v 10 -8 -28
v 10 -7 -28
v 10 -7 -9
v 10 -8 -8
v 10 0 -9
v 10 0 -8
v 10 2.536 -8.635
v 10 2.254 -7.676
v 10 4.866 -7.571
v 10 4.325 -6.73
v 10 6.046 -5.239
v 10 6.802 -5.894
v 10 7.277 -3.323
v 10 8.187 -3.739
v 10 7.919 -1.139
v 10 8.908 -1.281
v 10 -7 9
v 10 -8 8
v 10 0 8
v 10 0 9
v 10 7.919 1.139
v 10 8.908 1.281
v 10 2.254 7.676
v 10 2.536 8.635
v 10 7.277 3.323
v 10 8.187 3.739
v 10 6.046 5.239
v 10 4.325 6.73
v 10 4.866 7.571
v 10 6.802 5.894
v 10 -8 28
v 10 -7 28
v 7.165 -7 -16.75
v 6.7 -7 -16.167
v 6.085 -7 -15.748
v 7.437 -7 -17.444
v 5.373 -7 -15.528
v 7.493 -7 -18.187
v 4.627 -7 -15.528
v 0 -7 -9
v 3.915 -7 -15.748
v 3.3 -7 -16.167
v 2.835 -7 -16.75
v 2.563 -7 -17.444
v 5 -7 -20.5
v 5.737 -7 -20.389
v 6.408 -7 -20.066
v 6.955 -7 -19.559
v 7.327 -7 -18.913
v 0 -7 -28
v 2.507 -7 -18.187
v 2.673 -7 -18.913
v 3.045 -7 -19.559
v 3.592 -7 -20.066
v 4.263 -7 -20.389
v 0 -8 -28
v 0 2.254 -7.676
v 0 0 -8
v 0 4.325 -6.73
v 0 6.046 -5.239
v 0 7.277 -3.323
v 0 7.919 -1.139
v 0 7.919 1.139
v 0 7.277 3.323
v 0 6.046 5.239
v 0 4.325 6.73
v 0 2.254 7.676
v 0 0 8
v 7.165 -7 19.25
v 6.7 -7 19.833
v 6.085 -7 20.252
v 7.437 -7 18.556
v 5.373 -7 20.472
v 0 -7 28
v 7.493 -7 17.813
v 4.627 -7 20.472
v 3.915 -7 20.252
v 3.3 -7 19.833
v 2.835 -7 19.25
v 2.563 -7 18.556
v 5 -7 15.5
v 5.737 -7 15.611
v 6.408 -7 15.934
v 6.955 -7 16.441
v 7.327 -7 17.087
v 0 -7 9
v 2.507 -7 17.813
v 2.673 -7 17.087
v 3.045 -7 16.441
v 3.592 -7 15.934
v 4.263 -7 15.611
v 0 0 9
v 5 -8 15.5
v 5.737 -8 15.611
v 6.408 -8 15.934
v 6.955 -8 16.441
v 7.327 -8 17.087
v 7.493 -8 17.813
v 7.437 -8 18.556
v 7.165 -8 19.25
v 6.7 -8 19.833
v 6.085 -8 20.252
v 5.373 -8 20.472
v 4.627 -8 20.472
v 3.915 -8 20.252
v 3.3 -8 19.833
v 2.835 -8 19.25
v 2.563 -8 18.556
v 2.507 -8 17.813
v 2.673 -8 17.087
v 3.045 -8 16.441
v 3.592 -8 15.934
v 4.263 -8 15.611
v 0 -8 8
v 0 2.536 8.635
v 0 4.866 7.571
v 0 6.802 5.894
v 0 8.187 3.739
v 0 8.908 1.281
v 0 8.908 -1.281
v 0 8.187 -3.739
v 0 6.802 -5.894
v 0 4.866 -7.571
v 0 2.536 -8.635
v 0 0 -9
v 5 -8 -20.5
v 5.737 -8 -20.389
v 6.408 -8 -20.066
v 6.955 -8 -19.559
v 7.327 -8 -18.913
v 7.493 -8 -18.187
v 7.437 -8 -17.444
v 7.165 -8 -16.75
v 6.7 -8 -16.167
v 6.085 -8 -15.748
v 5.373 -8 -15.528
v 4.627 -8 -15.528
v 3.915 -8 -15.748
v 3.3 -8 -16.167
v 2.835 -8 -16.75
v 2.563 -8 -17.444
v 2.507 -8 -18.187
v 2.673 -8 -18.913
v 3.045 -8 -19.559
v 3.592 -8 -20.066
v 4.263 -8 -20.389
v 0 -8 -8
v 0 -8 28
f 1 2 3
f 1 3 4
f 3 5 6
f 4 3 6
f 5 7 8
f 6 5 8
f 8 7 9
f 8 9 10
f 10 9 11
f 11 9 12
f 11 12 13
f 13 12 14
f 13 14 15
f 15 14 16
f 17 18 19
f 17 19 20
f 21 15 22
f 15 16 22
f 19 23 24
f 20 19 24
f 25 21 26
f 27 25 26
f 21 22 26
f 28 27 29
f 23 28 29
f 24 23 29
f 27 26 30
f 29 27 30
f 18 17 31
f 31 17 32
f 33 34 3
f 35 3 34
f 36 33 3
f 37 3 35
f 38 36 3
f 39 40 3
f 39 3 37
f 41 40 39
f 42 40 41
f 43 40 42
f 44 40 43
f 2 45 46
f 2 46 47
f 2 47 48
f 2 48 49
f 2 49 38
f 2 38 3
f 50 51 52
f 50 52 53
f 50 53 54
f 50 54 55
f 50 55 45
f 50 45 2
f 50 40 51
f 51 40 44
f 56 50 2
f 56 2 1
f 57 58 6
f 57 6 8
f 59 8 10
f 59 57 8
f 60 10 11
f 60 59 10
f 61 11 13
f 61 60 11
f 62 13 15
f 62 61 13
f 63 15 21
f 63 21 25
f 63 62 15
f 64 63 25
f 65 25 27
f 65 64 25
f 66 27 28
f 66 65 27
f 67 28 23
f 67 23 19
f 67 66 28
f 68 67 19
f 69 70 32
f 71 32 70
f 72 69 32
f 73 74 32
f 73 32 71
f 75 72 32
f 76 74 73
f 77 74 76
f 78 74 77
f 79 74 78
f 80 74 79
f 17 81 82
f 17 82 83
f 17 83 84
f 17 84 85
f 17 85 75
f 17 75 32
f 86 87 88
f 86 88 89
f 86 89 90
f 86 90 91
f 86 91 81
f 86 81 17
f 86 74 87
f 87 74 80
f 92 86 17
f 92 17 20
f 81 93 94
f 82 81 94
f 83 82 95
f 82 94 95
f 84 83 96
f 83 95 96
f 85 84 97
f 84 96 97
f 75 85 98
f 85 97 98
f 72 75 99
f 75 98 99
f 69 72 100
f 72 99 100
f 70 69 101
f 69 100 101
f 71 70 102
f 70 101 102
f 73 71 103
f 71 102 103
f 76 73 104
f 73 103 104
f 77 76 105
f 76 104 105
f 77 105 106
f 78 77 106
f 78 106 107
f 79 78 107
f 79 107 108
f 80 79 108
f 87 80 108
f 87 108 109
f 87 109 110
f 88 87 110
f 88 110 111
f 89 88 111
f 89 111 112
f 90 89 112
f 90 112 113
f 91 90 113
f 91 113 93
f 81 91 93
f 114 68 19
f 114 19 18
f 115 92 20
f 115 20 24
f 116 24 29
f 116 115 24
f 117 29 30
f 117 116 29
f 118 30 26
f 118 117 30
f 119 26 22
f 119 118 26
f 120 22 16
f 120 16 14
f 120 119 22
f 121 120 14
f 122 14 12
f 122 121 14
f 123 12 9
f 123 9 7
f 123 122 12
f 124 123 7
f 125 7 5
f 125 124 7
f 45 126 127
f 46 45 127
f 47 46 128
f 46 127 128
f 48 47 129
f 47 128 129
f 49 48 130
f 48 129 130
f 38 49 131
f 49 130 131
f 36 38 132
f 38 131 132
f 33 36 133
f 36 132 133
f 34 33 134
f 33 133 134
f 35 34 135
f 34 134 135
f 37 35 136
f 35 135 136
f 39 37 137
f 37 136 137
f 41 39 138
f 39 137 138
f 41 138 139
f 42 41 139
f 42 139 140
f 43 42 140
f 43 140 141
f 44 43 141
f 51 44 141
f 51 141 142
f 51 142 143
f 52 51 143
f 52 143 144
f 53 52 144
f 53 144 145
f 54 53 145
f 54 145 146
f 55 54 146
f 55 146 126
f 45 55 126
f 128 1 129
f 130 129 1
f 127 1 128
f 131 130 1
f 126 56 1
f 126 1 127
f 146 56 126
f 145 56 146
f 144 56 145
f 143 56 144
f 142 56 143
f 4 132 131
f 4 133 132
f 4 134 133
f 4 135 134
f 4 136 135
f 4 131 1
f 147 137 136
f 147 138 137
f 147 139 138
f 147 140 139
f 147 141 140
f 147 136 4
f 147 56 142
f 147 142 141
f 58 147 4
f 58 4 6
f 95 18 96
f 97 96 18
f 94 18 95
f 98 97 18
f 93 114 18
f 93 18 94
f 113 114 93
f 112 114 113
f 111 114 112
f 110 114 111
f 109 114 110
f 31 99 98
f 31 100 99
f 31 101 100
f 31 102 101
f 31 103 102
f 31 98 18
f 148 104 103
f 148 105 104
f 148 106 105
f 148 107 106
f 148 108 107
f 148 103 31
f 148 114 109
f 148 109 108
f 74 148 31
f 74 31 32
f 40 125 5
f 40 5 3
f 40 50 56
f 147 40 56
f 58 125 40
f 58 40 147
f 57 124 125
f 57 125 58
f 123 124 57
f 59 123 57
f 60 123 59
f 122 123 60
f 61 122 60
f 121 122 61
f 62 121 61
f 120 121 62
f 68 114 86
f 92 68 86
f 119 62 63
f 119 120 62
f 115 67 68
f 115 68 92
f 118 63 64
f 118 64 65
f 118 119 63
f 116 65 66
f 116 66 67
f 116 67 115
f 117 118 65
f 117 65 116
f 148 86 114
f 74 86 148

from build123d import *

# Parameters (mm, degrees)
ESTRUSIONE_ESTRUSIONE1_DEPTH = 10
FORI_FILETTATI_5_0MM1_D      = 5
FORI_FILETTATI_5_0MM1_DEPTH  = 10
FORI_FILETTATI_5_0MM1_TIP    = 1.502151548
FORI_FILETTATI_5_0MM2_D      = 5
FORI_FILETTATI_5_0MM2_DEPTH  = 10
FORI_FILETTATI_5_0MM2_TIP    = 1.502151548


with BuildPart() as part:
    # Schizzo2 → Estrusione-Estrusione1 (new body)
    with BuildSketch(Plane(origin=(0, 0, 0), x_dir=(0, 0, -1), z_dir=(1, 0, 0))):
        with BuildLine():
            Line((-28, -7), (-9, -7))
            Line((-9, -7), (-9, 0))
            ThreePointArc((-9, 0), (0, 9), (9, 0))
            Line((9, 0), (9, -7))
            Line((9, -7), (28, -7))
            Line((28, -7), (28, -8))
            Line((28, -8), (8, -8))
            Line((8, -8), (8, 0))
            ThreePointArc((8, 0), (0, 8), (-8, 0))
            Line((-8, 0), (-8, -8))
            Line((-8, -8), (-28, -8))
            Line((-28, -8), (-28, -7))
        make_face()
    extrude(amount=ESTRUSIONE_ESTRUSIONE1_DEPTH)

    # Fori filettati Ø5.0mm1
    with Locations(Plane(origin=(5, -7, -18), x_dir=(0, 0, 1), z_dir=(0, 1, 0))):
        with Locations((0, 0)):
            Hole(FORI_FILETTATI_5_0MM1_D / 2, depth=FORI_FILETTATI_5_0MM1_DEPTH)
            with Locations((0, 0, -(FORI_FILETTATI_5_0MM1_DEPTH + FORI_FILETTATI_5_0MM1_TIP / 2))):  # 118° drill point
                Cone(0, FORI_FILETTATI_5_0MM1_D / 2, FORI_FILETTATI_5_0MM1_TIP, mode=Mode.SUBTRACT)

    # Fori filettati Ø5.0mm2
    with Locations(Plane(origin=(5, -7, 18), x_dir=(0, 0, 1), z_dir=(0, 1, 0))):
        with Locations((0, 0)):
            Hole(FORI_FILETTATI_5_0MM2_D / 2, depth=FORI_FILETTATI_5_0MM2_DEPTH)
            with Locations((0, 0, -(FORI_FILETTATI_5_0MM2_DEPTH + FORI_FILETTATI_5_0MM2_TIP / 2))):  # 118° drill point
                Cone(0, FORI_FILETTATI_5_0MM2_D / 2, FORI_FILETTATI_5_0MM2_TIP, mode=Mode.SUBTRACT)


solid = part.part
